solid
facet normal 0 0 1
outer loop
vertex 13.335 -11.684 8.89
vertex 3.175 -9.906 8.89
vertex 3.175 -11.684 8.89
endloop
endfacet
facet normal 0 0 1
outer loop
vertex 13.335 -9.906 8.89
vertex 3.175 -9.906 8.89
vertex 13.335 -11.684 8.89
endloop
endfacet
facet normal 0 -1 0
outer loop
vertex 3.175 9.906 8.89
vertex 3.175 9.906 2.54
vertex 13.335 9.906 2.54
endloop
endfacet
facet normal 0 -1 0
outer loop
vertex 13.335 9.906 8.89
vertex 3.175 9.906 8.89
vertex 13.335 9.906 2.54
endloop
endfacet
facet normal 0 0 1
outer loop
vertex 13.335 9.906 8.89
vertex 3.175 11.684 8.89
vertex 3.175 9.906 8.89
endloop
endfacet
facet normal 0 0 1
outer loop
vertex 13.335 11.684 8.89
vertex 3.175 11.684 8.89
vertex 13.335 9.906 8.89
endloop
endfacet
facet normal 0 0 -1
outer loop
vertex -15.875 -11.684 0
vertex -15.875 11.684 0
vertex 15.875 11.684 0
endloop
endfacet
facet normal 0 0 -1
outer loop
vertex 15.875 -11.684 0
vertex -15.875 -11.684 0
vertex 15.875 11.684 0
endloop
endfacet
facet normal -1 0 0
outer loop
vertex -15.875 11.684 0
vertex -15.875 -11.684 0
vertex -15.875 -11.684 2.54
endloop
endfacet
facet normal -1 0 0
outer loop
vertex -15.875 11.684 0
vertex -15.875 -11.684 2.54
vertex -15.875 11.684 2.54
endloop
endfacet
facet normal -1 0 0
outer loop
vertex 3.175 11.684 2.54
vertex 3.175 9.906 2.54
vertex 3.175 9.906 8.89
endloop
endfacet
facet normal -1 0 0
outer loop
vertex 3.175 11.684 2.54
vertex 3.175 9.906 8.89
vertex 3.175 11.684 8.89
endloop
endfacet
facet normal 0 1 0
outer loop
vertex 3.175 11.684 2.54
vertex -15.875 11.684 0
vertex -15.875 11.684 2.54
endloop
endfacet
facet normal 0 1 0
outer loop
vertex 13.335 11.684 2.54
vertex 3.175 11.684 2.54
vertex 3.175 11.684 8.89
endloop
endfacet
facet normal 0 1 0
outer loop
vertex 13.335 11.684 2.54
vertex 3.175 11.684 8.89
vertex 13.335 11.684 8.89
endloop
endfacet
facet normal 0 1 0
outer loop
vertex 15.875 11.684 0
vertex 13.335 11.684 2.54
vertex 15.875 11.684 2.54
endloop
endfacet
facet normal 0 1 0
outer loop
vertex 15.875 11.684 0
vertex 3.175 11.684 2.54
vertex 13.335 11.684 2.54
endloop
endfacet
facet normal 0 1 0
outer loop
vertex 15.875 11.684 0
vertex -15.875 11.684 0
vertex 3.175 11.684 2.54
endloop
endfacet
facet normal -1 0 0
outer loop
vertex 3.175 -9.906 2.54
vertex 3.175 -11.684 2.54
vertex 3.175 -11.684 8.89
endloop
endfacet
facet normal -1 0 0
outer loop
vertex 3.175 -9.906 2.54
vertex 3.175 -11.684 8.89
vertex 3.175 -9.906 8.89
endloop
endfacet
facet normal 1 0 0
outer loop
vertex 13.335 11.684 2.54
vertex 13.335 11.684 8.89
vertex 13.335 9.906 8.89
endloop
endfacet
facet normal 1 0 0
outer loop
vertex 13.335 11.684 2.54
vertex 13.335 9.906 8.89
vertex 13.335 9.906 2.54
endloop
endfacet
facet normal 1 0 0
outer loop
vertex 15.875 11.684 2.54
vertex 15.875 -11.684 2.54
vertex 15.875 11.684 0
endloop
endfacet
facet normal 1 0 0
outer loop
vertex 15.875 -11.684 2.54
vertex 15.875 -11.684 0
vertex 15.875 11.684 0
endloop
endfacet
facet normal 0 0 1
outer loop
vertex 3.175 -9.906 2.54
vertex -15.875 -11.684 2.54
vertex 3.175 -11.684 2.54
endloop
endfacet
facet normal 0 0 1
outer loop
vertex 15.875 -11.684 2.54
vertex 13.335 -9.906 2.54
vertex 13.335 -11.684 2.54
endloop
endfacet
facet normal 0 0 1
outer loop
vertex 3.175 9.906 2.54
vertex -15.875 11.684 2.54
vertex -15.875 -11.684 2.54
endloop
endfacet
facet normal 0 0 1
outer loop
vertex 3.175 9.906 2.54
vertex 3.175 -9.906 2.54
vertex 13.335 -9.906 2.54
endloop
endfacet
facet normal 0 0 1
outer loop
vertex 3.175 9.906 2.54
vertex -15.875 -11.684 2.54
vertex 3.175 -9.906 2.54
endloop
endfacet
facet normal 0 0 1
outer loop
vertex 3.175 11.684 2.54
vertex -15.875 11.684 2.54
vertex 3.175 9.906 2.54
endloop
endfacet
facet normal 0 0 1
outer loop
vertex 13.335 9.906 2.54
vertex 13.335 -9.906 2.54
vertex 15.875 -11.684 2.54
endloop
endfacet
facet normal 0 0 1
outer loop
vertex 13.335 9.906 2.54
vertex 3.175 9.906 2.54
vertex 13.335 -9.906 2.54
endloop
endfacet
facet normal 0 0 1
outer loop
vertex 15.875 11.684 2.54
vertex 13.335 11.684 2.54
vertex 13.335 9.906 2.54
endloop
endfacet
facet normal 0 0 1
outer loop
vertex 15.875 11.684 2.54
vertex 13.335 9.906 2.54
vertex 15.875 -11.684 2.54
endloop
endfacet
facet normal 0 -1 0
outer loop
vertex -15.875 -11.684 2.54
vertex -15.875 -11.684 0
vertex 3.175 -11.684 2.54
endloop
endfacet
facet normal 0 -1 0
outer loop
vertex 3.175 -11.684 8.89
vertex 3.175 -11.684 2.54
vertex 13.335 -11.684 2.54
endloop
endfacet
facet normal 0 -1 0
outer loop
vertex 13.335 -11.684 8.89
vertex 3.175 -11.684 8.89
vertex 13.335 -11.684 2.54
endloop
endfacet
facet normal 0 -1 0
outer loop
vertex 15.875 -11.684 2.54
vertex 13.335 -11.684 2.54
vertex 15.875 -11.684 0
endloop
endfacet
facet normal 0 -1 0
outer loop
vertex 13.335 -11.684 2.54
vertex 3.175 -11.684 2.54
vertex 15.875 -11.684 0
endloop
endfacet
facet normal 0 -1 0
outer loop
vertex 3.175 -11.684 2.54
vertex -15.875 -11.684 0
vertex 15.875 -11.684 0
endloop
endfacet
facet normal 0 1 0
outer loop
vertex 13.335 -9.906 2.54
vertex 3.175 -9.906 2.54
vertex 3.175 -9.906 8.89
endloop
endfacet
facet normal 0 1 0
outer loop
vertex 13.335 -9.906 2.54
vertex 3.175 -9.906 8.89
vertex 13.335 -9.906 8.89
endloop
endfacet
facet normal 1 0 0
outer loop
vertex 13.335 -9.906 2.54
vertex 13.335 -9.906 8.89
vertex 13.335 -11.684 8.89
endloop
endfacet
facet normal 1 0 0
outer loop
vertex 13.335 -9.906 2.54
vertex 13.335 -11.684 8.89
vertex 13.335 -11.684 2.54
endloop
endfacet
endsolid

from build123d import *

# Parameters (mm, degrees)
SKETCH2_W           = 31.75
SKETCH2_H           = 23.368
BOSS_EXTRUDE1_DEPTH = 2.54
SKETCH3_W           = 12.7
SKETCH3_H           = 1.778
BOSS_EXTRUDE2_DEPTH = 6.35
SKETCH4_W           = 2.54
SKETCH4_H           = 6.35
CUT_EXTRUDE1_DEPTH  = 24.368


with BuildPart() as part:
    # Sketch2 → Boss-Extrude1 (new body)
    with BuildSketch(Plane.XY):
        Rectangle(SKETCH2_W, SKETCH2_H)
    extrude(amount=BOSS_EXTRUDE1_DEPTH)

    # Sketch3 → Boss-Extrude2 (add)
    with BuildSketch(Plane.XY.offset(2.54)):
        with Locations((9.525, 10.795)):
            Rectangle(SKETCH3_W, SKETCH3_H)
        with Locations((9.525, -10.795)):
            Rectangle(SKETCH3_W, SKETCH3_H)
    extrude(amount=BOSS_EXTRUDE2_DEPTH)

    # Sketch4 → Cut-Extrude1 (cut, through all)
    with BuildSketch(Plane(origin=(0, 11.684, 0), x_dir=(1, 0, 0), z_dir=(0, 1, 0))):
        with Locations((14.605, -5.715)):
            Rectangle(SKETCH4_W, SKETCH4_H)
    extrude(amount=-CUT_EXTRUDE1_DEPTH, mode=Mode.SUBTRACT)


solid = part.part
